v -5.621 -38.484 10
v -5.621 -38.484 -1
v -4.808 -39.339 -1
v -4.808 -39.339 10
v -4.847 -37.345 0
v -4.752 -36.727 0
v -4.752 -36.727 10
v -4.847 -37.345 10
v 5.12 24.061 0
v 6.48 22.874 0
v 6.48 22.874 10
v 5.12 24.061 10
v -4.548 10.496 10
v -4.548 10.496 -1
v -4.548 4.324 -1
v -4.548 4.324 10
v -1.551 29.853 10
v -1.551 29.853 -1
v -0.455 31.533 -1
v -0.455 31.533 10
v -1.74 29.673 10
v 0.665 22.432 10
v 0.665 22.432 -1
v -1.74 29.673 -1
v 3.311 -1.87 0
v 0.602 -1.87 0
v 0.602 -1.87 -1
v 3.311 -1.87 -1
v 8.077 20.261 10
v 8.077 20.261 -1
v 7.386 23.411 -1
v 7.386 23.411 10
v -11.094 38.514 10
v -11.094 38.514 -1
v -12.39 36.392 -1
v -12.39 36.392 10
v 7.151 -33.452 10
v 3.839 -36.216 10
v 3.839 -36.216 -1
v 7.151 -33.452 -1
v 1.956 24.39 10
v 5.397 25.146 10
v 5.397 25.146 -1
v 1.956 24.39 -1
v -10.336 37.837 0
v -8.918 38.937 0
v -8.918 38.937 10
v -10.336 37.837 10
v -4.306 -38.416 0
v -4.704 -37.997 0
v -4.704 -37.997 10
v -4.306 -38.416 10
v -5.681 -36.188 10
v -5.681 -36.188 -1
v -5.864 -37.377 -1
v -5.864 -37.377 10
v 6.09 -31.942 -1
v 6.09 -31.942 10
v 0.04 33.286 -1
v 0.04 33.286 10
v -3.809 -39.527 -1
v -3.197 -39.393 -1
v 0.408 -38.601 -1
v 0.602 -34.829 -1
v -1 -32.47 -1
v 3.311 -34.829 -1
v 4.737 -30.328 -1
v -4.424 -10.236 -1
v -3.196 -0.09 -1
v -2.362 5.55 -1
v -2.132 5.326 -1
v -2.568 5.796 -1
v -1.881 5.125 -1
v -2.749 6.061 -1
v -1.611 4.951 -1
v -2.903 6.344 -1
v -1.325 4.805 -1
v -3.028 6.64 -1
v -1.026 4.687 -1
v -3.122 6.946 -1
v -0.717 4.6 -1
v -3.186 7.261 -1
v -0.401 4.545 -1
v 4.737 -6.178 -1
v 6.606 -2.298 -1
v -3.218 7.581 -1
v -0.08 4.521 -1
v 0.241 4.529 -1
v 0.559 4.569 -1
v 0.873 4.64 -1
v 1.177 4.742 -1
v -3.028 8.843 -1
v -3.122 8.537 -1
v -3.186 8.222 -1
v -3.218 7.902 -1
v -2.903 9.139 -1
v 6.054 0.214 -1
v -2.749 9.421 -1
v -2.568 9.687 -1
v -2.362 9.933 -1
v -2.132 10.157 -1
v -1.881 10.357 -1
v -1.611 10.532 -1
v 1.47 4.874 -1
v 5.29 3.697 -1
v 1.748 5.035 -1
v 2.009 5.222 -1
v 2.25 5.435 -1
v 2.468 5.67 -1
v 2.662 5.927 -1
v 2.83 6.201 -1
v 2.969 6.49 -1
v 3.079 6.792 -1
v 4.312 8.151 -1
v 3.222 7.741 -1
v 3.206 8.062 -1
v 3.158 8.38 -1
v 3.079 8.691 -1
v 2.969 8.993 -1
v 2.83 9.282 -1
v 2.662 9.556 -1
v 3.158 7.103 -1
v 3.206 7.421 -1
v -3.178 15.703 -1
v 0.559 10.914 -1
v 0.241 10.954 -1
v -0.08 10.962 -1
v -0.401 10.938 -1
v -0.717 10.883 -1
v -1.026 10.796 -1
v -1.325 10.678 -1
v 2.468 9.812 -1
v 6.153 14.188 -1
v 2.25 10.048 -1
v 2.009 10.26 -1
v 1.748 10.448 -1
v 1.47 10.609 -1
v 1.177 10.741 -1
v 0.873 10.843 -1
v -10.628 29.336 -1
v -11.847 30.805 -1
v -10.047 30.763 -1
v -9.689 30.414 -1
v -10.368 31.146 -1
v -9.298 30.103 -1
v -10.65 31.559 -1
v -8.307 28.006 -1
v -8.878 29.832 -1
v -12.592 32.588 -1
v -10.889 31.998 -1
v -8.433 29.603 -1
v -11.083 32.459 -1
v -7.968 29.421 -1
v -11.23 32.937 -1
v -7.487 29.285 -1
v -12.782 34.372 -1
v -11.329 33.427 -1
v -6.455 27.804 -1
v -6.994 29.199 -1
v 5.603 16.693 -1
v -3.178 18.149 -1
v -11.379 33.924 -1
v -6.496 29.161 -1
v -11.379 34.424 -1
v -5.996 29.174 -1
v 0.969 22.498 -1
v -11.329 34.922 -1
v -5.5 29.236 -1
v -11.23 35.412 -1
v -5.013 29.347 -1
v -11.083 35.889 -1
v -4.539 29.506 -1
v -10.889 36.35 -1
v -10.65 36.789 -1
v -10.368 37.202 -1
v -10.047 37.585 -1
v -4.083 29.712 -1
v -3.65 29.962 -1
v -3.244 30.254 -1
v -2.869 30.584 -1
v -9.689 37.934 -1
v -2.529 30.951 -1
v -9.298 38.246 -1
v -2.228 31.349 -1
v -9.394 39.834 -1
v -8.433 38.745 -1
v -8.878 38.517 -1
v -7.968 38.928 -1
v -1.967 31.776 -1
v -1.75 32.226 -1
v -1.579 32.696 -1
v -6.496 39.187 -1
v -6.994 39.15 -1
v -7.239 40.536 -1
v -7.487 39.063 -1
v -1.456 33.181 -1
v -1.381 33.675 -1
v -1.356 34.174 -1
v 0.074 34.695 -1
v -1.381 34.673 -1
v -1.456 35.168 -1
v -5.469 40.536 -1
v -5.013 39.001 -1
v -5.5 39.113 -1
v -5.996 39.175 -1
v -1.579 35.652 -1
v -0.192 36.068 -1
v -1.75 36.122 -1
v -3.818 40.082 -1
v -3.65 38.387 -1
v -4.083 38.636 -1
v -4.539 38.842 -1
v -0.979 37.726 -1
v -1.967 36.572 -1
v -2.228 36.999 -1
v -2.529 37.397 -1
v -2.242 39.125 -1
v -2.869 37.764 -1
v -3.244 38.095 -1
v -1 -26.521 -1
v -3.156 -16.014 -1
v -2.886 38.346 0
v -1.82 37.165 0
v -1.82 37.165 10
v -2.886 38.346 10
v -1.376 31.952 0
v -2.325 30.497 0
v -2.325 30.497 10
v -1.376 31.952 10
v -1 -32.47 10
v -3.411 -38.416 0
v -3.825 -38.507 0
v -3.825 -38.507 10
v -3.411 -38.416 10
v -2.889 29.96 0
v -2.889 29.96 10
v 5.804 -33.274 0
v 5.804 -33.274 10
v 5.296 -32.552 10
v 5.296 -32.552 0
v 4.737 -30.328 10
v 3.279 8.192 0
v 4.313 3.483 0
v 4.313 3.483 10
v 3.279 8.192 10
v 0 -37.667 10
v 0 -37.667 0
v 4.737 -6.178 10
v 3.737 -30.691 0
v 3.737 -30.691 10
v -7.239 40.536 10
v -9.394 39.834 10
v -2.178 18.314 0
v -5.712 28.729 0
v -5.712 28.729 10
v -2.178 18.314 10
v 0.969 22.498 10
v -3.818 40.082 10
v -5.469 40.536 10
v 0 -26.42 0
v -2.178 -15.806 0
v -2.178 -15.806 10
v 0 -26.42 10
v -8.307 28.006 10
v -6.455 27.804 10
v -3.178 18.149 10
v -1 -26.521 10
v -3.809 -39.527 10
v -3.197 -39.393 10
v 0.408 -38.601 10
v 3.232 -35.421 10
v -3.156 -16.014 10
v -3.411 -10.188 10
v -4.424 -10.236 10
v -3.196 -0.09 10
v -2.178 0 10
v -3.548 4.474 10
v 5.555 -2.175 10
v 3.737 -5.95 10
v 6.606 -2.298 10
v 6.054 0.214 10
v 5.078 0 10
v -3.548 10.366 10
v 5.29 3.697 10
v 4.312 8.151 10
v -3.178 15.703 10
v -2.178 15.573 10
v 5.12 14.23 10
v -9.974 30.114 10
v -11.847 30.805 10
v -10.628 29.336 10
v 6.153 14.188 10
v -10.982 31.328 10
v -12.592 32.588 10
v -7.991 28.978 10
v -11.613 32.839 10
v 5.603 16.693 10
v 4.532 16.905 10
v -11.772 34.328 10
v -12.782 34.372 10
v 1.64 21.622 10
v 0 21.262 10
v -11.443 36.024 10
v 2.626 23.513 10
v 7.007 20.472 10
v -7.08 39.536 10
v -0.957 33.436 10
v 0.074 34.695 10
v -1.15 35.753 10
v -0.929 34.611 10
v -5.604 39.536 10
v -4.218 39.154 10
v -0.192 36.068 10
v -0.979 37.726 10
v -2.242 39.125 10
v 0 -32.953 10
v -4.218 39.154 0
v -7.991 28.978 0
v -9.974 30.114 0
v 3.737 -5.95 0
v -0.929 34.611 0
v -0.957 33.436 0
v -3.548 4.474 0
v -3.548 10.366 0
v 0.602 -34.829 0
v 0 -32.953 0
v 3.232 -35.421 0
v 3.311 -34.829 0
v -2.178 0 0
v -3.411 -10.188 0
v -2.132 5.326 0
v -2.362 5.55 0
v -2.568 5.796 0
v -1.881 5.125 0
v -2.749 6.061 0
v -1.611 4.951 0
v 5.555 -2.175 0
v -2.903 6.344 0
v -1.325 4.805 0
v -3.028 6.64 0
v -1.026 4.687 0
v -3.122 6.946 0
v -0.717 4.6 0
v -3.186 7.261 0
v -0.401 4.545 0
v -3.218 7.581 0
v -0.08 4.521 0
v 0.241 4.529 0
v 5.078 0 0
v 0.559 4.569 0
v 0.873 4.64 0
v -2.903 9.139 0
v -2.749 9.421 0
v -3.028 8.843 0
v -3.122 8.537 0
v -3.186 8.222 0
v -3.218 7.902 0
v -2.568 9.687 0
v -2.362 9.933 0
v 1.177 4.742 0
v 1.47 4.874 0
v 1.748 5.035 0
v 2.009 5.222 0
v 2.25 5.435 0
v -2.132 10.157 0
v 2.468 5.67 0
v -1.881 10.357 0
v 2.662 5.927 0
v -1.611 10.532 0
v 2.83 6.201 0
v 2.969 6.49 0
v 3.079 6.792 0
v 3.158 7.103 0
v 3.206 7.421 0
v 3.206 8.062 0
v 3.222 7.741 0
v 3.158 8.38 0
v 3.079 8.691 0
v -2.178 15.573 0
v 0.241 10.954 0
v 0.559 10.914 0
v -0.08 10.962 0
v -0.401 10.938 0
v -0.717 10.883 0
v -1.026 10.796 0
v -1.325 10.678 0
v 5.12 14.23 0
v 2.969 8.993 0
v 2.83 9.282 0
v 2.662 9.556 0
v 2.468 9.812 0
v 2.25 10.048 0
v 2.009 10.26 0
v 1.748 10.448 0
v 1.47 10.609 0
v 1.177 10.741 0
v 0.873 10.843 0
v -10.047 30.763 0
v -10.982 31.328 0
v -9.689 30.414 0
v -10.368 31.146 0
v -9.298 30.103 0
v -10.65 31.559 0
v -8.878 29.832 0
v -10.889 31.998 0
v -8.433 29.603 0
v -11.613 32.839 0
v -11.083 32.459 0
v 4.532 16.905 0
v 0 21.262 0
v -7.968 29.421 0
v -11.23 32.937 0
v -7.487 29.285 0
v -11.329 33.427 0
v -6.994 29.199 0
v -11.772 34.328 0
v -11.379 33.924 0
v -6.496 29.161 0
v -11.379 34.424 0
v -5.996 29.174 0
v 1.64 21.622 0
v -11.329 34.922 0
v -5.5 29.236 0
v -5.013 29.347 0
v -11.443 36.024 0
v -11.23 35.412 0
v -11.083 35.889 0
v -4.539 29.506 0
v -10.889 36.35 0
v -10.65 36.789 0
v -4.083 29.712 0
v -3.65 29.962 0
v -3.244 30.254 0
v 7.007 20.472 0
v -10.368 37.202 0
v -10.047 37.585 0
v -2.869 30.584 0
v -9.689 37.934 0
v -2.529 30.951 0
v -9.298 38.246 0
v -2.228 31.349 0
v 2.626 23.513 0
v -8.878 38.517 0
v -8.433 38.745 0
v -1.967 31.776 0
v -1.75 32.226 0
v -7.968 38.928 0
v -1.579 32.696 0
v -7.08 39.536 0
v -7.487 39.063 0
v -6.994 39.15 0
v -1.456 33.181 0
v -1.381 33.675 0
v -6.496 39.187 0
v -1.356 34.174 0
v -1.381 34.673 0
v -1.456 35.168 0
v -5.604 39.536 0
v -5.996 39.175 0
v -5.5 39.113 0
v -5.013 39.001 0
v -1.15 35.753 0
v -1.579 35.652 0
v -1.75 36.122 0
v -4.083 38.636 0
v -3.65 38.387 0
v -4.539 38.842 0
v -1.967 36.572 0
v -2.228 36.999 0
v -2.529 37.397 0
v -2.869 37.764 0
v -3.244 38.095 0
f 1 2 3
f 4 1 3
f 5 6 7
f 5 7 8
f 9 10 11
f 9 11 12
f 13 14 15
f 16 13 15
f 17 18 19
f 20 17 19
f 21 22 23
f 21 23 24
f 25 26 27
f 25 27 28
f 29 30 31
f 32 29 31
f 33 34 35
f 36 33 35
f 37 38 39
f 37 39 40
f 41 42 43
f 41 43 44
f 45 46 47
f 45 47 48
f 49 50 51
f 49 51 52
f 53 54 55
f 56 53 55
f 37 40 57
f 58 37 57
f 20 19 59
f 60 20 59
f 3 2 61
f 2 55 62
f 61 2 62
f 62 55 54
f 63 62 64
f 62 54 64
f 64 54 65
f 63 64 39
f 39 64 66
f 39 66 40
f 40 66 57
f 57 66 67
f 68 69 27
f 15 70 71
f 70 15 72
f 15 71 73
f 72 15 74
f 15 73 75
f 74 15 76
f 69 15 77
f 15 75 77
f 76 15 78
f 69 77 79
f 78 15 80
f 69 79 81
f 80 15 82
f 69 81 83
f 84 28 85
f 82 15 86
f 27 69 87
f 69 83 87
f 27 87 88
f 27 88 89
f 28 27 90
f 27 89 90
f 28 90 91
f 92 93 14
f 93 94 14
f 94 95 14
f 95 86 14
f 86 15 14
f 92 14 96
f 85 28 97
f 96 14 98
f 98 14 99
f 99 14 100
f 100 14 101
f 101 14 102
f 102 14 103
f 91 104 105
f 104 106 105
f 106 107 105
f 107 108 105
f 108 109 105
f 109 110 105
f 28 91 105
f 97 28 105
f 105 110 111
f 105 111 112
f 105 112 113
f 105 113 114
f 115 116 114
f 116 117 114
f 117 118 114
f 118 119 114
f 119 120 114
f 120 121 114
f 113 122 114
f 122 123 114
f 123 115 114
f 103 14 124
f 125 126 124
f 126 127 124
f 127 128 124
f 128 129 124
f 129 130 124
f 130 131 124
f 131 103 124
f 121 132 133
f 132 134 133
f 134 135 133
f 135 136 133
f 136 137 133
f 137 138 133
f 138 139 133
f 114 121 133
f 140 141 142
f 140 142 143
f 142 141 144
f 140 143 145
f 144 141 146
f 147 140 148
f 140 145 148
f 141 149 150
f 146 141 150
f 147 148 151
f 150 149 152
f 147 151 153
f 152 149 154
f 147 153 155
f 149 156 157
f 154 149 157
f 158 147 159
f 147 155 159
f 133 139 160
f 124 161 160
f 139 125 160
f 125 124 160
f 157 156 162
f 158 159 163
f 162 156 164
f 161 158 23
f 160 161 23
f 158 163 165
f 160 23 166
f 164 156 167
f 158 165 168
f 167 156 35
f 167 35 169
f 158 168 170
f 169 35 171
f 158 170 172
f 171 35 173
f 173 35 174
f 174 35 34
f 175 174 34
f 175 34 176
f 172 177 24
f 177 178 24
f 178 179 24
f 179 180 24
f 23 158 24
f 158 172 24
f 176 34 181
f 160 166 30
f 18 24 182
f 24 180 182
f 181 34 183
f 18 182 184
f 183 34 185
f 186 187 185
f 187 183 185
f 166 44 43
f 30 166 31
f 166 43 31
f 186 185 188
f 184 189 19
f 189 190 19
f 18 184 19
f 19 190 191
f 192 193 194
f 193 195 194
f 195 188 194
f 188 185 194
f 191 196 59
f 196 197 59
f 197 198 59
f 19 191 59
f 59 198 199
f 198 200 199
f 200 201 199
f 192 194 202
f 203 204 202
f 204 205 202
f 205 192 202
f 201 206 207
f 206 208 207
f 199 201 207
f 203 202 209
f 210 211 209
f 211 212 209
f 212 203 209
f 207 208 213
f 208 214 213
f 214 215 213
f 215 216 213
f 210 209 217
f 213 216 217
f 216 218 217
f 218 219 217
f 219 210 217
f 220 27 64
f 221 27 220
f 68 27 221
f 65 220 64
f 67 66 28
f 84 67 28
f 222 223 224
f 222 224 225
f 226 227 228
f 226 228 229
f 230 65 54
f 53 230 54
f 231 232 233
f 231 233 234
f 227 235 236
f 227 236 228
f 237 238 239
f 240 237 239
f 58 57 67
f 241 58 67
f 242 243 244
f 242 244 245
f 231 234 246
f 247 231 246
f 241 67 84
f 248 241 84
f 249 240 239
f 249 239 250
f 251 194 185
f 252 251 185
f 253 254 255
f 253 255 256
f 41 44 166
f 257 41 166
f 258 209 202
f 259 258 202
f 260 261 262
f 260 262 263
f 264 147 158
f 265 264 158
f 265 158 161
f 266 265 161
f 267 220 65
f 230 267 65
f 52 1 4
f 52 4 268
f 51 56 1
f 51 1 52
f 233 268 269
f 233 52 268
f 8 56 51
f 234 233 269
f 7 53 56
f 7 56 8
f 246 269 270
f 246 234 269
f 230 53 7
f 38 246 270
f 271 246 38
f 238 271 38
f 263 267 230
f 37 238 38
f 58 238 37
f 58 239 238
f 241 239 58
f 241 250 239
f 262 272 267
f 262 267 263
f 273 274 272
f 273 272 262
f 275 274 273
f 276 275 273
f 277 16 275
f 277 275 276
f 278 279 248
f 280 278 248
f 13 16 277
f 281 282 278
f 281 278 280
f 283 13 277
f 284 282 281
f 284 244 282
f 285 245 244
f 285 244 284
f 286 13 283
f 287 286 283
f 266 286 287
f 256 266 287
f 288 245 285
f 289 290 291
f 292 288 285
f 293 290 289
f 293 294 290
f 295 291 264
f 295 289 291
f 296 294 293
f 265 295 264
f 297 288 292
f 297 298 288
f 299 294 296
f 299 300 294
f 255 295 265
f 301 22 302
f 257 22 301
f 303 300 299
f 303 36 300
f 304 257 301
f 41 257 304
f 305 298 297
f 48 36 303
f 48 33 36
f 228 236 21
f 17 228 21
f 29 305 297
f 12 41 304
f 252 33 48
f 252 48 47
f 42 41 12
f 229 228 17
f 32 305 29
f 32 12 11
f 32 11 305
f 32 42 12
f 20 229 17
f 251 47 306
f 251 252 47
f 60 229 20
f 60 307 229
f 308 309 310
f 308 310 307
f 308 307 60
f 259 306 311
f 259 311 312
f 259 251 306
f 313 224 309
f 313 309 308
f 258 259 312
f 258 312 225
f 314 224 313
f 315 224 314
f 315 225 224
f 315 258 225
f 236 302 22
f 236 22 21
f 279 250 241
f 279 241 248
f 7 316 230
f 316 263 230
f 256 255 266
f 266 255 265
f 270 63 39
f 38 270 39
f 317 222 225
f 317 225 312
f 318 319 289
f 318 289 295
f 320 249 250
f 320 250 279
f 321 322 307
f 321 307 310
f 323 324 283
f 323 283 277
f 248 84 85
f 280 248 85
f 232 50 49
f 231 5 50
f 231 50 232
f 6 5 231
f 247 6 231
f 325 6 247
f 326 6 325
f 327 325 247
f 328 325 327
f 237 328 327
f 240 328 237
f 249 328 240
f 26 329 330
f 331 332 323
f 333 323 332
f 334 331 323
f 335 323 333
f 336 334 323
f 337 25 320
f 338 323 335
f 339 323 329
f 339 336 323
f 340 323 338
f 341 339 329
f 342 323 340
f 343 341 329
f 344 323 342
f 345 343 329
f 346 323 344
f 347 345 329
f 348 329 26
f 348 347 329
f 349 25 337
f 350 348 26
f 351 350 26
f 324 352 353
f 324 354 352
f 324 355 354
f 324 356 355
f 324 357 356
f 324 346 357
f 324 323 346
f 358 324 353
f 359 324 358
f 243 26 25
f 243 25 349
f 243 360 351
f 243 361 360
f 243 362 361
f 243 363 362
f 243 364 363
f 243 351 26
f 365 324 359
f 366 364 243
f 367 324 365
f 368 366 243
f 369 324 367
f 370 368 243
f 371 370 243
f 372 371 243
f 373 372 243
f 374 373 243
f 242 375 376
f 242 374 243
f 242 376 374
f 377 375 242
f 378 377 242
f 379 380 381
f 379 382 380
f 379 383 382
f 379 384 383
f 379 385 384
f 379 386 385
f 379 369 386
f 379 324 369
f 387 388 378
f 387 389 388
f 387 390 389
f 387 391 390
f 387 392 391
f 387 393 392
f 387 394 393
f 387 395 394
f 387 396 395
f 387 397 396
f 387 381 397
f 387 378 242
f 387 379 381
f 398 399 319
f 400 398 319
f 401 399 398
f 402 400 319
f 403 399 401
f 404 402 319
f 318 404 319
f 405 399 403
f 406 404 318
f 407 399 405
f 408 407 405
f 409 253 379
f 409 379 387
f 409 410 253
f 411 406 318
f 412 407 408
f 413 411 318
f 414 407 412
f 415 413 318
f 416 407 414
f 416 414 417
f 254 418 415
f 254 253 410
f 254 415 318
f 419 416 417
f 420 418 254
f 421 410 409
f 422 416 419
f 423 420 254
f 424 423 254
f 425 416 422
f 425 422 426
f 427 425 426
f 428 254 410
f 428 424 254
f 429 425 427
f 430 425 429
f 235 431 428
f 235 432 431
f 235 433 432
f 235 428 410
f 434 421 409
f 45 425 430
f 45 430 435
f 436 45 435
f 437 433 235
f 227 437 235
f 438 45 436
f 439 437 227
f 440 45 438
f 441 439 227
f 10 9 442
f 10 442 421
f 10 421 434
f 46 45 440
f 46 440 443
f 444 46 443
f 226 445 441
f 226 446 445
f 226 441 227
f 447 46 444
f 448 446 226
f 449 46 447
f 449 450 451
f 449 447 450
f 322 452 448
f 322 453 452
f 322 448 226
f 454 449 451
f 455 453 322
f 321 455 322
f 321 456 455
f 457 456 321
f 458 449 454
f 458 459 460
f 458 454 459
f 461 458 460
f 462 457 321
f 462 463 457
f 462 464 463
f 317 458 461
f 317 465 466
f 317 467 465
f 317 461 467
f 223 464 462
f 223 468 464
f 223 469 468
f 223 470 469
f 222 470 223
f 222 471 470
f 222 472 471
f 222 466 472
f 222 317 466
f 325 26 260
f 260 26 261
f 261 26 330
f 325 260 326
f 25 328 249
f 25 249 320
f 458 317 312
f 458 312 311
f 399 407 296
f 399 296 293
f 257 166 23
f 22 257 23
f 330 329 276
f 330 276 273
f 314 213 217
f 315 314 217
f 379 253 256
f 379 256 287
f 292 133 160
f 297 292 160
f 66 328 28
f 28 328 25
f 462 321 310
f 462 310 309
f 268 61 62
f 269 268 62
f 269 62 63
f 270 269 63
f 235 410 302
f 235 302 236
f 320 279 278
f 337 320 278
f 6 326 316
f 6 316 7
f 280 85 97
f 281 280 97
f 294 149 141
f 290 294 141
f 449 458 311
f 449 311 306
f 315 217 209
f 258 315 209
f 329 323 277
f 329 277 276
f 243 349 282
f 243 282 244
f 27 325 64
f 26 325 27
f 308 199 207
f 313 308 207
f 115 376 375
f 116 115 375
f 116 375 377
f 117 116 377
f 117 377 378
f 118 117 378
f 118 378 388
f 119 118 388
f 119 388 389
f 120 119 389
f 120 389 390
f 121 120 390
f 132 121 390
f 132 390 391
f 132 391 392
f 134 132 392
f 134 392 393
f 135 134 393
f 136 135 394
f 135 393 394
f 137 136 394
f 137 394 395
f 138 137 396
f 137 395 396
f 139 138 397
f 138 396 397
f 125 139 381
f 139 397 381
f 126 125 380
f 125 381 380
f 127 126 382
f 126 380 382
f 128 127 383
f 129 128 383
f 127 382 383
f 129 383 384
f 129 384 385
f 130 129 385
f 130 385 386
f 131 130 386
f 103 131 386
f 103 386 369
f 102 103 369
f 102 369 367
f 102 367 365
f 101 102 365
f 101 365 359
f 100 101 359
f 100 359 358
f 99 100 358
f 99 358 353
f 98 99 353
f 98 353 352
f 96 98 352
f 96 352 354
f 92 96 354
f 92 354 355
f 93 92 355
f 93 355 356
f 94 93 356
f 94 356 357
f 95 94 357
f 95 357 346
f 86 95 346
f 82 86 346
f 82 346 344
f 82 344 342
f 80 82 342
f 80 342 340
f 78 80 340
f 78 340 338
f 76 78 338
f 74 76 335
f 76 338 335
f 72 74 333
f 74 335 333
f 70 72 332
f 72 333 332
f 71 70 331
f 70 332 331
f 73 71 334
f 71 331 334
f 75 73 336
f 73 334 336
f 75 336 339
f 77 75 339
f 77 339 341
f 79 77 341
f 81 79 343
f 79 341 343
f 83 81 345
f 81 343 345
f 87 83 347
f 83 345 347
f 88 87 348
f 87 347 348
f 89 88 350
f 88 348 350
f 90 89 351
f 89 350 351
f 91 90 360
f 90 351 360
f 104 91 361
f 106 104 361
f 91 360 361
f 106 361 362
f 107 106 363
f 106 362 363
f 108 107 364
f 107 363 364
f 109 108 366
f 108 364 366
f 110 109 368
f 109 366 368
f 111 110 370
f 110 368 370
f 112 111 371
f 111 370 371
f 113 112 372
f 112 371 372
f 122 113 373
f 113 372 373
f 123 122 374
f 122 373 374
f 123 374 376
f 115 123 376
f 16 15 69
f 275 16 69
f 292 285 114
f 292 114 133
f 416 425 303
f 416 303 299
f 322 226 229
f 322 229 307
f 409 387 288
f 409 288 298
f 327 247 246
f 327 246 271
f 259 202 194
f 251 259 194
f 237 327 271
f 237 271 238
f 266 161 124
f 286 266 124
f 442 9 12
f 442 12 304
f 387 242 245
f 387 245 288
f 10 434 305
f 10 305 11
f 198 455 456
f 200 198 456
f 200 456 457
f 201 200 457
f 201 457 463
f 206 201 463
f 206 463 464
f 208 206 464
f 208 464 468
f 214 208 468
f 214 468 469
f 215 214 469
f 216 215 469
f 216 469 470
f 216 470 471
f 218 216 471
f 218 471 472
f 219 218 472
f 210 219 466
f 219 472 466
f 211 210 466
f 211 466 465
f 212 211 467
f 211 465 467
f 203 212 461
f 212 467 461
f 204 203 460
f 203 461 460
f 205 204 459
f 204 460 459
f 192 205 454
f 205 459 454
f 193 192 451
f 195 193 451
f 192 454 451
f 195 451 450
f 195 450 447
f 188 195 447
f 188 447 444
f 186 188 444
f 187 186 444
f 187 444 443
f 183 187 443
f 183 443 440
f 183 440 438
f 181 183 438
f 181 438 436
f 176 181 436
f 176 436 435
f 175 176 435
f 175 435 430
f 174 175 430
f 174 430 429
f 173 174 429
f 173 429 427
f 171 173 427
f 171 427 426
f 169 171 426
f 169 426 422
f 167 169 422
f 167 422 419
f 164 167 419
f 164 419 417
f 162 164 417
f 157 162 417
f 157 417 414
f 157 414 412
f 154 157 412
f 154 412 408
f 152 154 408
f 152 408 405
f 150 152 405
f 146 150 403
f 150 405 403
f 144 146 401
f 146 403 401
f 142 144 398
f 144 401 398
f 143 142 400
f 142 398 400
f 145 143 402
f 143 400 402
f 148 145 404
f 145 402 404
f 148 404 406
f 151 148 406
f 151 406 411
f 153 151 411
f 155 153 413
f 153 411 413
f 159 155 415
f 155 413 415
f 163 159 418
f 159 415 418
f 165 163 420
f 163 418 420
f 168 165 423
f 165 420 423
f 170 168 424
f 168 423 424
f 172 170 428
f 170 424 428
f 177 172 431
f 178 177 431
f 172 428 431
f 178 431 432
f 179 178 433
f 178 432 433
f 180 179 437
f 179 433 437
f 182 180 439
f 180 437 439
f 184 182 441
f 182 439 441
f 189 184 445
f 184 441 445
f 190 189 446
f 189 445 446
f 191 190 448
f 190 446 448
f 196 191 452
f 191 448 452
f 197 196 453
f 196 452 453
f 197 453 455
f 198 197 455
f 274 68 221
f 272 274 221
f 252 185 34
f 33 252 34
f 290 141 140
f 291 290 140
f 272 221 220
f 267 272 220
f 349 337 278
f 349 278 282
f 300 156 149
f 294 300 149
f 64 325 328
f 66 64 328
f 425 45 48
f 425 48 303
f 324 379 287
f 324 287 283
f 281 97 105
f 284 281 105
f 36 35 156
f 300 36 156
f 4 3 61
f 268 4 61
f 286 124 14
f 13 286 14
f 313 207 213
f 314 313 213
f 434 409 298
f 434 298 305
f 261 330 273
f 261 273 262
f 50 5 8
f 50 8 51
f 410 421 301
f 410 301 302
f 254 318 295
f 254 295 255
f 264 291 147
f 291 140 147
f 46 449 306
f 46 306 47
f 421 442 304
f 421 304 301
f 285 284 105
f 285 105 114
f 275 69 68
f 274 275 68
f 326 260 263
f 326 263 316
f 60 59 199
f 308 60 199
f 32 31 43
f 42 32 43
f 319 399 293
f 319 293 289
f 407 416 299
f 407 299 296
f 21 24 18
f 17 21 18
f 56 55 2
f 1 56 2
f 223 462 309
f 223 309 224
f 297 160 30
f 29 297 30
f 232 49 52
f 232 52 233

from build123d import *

# Parameters (mm, degrees)
F1_DEPTH = 10
F2_T     = 1
F3_R     = 3.2218950318
F4_DEPTH = 25.4
F5_R     = 5.0145008795
F6_DEPTH = 25.4
F7_W     = 2.708992688
F7_H     = 32.9594105715
F8_DEPTH = 25


with BuildPart() as f1:
    # F0 (on Top) → F1 (new body)
    with BuildSketch(Plane.XY):
        Polygon((-7.9906535461, 28.9775509901), (-5.7124293756, 28.7289765854), (-2.177747665, 18.313806504), (-2.177747665, 15.5732491985), (-3.5480263177, 10.3661902249), (-3.5480263177, 4.4739907607), (-2.177747665, 0), (-3.410998499, -10.1879928261), (-2.177747665, -15.8061366528), (0, -26.4196246862), (0, -29.9038495868), (0, -32.9525433481), (-4.7522801906, -36.7271192372), (-4.846881947, -37.3447827538), (-4.7036297619, -37.9973761737), (-4.3055904098, -38.4158245646), (-3.8245406306, -38.5066020873), (-3.410998499, -38.4158245646), (0, -37.6670689483), (3.2324001659, -35.4205369949), (5.8037610725, -33.2740206294), (5.2963984199, -32.5517579913), (3.7367703403, -30.6914262474), (3.7367703403, -30.091624707), (3.7367703403, -28.8444478065), (3.7367703403, -22.7698273957), (3.7367703403, -15.2410743758), (3.7367703403, -5.9498115443), (5.555216223, -2.1752356552), (5.0777255662, 0), (4.3131460861, 3.4830850037), (3.2794470092, 8.1921595303), (5.119686015, 14.2296506092), (4.5323909172, 16.9051065964), (7.0069744252, 20.4722173512), (6.4797433326, 22.8740483706), (5.119686015, 24.0607738481), (2.6262372261, 23.513431542), (1.6395514831, 21.6216556728), (0, 21.2617542006), (-2.8885214715, 29.960425262), (-2.3250187241, 30.496619276), (-1.3758151717, 31.9517953008), (-0.9570455703, 33.4362002962), (-0.9286604067, 34.6111891241), (-1.1501351436, 35.753425343), (-1.8199630103, 37.1648714688), (-2.8861434893, 38.3458743138), (-4.2181453118, 39.1544558587), (-5.6038486027, 39.5364638273), (-7.0804168612, 39.5364638273), (-8.9181209402, 38.937315781), (-10.336358338, 37.8366215939), (-11.4427582769, 36.0244784539), (-11.7720668322, 34.3284905467), (-11.6132239292, 32.8387650441), (-10.9819831447, 31.3281121322), (-9.9742822169, 30.1140705775), align=None)
    extrude(amount=F1_DEPTH)

    # F2
    f2_openings = [f1.faces().sort_by_distance(p)[0] for p in [
        (-0.518875, 3.902711, 10),
    ]]
    offset(amount=F2_T, openings=f2_openings, kind=Kind.INTERSECTION)

    # F3 (on Top) → F4 (cut)
    with BuildSketch(Plane.XY):
        with Locations((0, 7.7414768748)):
            Circle(F3_R)
    extrude(amount=-F4_DEPTH, mode=Mode.SUBTRACT)

    # F5 (on Top) → F6 (cut)
    with BuildSketch(Plane.XY):
        with Locations((-6.3707926311, 34.1742038727)):
            Circle(F5_R)
    extrude(amount=-F6_DEPTH, mode=Mode.SUBTRACT)

    # F7 (on Top) → F8 (cut)
    with BuildSketch(Plane.XY):
        with Locations((1.9566247938, -18.3495350066)):
            Rectangle(F7_W, F7_H)
    extrude(amount=-F8_DEPTH, mode=Mode.SUBTRACT)


solid = f1.part
